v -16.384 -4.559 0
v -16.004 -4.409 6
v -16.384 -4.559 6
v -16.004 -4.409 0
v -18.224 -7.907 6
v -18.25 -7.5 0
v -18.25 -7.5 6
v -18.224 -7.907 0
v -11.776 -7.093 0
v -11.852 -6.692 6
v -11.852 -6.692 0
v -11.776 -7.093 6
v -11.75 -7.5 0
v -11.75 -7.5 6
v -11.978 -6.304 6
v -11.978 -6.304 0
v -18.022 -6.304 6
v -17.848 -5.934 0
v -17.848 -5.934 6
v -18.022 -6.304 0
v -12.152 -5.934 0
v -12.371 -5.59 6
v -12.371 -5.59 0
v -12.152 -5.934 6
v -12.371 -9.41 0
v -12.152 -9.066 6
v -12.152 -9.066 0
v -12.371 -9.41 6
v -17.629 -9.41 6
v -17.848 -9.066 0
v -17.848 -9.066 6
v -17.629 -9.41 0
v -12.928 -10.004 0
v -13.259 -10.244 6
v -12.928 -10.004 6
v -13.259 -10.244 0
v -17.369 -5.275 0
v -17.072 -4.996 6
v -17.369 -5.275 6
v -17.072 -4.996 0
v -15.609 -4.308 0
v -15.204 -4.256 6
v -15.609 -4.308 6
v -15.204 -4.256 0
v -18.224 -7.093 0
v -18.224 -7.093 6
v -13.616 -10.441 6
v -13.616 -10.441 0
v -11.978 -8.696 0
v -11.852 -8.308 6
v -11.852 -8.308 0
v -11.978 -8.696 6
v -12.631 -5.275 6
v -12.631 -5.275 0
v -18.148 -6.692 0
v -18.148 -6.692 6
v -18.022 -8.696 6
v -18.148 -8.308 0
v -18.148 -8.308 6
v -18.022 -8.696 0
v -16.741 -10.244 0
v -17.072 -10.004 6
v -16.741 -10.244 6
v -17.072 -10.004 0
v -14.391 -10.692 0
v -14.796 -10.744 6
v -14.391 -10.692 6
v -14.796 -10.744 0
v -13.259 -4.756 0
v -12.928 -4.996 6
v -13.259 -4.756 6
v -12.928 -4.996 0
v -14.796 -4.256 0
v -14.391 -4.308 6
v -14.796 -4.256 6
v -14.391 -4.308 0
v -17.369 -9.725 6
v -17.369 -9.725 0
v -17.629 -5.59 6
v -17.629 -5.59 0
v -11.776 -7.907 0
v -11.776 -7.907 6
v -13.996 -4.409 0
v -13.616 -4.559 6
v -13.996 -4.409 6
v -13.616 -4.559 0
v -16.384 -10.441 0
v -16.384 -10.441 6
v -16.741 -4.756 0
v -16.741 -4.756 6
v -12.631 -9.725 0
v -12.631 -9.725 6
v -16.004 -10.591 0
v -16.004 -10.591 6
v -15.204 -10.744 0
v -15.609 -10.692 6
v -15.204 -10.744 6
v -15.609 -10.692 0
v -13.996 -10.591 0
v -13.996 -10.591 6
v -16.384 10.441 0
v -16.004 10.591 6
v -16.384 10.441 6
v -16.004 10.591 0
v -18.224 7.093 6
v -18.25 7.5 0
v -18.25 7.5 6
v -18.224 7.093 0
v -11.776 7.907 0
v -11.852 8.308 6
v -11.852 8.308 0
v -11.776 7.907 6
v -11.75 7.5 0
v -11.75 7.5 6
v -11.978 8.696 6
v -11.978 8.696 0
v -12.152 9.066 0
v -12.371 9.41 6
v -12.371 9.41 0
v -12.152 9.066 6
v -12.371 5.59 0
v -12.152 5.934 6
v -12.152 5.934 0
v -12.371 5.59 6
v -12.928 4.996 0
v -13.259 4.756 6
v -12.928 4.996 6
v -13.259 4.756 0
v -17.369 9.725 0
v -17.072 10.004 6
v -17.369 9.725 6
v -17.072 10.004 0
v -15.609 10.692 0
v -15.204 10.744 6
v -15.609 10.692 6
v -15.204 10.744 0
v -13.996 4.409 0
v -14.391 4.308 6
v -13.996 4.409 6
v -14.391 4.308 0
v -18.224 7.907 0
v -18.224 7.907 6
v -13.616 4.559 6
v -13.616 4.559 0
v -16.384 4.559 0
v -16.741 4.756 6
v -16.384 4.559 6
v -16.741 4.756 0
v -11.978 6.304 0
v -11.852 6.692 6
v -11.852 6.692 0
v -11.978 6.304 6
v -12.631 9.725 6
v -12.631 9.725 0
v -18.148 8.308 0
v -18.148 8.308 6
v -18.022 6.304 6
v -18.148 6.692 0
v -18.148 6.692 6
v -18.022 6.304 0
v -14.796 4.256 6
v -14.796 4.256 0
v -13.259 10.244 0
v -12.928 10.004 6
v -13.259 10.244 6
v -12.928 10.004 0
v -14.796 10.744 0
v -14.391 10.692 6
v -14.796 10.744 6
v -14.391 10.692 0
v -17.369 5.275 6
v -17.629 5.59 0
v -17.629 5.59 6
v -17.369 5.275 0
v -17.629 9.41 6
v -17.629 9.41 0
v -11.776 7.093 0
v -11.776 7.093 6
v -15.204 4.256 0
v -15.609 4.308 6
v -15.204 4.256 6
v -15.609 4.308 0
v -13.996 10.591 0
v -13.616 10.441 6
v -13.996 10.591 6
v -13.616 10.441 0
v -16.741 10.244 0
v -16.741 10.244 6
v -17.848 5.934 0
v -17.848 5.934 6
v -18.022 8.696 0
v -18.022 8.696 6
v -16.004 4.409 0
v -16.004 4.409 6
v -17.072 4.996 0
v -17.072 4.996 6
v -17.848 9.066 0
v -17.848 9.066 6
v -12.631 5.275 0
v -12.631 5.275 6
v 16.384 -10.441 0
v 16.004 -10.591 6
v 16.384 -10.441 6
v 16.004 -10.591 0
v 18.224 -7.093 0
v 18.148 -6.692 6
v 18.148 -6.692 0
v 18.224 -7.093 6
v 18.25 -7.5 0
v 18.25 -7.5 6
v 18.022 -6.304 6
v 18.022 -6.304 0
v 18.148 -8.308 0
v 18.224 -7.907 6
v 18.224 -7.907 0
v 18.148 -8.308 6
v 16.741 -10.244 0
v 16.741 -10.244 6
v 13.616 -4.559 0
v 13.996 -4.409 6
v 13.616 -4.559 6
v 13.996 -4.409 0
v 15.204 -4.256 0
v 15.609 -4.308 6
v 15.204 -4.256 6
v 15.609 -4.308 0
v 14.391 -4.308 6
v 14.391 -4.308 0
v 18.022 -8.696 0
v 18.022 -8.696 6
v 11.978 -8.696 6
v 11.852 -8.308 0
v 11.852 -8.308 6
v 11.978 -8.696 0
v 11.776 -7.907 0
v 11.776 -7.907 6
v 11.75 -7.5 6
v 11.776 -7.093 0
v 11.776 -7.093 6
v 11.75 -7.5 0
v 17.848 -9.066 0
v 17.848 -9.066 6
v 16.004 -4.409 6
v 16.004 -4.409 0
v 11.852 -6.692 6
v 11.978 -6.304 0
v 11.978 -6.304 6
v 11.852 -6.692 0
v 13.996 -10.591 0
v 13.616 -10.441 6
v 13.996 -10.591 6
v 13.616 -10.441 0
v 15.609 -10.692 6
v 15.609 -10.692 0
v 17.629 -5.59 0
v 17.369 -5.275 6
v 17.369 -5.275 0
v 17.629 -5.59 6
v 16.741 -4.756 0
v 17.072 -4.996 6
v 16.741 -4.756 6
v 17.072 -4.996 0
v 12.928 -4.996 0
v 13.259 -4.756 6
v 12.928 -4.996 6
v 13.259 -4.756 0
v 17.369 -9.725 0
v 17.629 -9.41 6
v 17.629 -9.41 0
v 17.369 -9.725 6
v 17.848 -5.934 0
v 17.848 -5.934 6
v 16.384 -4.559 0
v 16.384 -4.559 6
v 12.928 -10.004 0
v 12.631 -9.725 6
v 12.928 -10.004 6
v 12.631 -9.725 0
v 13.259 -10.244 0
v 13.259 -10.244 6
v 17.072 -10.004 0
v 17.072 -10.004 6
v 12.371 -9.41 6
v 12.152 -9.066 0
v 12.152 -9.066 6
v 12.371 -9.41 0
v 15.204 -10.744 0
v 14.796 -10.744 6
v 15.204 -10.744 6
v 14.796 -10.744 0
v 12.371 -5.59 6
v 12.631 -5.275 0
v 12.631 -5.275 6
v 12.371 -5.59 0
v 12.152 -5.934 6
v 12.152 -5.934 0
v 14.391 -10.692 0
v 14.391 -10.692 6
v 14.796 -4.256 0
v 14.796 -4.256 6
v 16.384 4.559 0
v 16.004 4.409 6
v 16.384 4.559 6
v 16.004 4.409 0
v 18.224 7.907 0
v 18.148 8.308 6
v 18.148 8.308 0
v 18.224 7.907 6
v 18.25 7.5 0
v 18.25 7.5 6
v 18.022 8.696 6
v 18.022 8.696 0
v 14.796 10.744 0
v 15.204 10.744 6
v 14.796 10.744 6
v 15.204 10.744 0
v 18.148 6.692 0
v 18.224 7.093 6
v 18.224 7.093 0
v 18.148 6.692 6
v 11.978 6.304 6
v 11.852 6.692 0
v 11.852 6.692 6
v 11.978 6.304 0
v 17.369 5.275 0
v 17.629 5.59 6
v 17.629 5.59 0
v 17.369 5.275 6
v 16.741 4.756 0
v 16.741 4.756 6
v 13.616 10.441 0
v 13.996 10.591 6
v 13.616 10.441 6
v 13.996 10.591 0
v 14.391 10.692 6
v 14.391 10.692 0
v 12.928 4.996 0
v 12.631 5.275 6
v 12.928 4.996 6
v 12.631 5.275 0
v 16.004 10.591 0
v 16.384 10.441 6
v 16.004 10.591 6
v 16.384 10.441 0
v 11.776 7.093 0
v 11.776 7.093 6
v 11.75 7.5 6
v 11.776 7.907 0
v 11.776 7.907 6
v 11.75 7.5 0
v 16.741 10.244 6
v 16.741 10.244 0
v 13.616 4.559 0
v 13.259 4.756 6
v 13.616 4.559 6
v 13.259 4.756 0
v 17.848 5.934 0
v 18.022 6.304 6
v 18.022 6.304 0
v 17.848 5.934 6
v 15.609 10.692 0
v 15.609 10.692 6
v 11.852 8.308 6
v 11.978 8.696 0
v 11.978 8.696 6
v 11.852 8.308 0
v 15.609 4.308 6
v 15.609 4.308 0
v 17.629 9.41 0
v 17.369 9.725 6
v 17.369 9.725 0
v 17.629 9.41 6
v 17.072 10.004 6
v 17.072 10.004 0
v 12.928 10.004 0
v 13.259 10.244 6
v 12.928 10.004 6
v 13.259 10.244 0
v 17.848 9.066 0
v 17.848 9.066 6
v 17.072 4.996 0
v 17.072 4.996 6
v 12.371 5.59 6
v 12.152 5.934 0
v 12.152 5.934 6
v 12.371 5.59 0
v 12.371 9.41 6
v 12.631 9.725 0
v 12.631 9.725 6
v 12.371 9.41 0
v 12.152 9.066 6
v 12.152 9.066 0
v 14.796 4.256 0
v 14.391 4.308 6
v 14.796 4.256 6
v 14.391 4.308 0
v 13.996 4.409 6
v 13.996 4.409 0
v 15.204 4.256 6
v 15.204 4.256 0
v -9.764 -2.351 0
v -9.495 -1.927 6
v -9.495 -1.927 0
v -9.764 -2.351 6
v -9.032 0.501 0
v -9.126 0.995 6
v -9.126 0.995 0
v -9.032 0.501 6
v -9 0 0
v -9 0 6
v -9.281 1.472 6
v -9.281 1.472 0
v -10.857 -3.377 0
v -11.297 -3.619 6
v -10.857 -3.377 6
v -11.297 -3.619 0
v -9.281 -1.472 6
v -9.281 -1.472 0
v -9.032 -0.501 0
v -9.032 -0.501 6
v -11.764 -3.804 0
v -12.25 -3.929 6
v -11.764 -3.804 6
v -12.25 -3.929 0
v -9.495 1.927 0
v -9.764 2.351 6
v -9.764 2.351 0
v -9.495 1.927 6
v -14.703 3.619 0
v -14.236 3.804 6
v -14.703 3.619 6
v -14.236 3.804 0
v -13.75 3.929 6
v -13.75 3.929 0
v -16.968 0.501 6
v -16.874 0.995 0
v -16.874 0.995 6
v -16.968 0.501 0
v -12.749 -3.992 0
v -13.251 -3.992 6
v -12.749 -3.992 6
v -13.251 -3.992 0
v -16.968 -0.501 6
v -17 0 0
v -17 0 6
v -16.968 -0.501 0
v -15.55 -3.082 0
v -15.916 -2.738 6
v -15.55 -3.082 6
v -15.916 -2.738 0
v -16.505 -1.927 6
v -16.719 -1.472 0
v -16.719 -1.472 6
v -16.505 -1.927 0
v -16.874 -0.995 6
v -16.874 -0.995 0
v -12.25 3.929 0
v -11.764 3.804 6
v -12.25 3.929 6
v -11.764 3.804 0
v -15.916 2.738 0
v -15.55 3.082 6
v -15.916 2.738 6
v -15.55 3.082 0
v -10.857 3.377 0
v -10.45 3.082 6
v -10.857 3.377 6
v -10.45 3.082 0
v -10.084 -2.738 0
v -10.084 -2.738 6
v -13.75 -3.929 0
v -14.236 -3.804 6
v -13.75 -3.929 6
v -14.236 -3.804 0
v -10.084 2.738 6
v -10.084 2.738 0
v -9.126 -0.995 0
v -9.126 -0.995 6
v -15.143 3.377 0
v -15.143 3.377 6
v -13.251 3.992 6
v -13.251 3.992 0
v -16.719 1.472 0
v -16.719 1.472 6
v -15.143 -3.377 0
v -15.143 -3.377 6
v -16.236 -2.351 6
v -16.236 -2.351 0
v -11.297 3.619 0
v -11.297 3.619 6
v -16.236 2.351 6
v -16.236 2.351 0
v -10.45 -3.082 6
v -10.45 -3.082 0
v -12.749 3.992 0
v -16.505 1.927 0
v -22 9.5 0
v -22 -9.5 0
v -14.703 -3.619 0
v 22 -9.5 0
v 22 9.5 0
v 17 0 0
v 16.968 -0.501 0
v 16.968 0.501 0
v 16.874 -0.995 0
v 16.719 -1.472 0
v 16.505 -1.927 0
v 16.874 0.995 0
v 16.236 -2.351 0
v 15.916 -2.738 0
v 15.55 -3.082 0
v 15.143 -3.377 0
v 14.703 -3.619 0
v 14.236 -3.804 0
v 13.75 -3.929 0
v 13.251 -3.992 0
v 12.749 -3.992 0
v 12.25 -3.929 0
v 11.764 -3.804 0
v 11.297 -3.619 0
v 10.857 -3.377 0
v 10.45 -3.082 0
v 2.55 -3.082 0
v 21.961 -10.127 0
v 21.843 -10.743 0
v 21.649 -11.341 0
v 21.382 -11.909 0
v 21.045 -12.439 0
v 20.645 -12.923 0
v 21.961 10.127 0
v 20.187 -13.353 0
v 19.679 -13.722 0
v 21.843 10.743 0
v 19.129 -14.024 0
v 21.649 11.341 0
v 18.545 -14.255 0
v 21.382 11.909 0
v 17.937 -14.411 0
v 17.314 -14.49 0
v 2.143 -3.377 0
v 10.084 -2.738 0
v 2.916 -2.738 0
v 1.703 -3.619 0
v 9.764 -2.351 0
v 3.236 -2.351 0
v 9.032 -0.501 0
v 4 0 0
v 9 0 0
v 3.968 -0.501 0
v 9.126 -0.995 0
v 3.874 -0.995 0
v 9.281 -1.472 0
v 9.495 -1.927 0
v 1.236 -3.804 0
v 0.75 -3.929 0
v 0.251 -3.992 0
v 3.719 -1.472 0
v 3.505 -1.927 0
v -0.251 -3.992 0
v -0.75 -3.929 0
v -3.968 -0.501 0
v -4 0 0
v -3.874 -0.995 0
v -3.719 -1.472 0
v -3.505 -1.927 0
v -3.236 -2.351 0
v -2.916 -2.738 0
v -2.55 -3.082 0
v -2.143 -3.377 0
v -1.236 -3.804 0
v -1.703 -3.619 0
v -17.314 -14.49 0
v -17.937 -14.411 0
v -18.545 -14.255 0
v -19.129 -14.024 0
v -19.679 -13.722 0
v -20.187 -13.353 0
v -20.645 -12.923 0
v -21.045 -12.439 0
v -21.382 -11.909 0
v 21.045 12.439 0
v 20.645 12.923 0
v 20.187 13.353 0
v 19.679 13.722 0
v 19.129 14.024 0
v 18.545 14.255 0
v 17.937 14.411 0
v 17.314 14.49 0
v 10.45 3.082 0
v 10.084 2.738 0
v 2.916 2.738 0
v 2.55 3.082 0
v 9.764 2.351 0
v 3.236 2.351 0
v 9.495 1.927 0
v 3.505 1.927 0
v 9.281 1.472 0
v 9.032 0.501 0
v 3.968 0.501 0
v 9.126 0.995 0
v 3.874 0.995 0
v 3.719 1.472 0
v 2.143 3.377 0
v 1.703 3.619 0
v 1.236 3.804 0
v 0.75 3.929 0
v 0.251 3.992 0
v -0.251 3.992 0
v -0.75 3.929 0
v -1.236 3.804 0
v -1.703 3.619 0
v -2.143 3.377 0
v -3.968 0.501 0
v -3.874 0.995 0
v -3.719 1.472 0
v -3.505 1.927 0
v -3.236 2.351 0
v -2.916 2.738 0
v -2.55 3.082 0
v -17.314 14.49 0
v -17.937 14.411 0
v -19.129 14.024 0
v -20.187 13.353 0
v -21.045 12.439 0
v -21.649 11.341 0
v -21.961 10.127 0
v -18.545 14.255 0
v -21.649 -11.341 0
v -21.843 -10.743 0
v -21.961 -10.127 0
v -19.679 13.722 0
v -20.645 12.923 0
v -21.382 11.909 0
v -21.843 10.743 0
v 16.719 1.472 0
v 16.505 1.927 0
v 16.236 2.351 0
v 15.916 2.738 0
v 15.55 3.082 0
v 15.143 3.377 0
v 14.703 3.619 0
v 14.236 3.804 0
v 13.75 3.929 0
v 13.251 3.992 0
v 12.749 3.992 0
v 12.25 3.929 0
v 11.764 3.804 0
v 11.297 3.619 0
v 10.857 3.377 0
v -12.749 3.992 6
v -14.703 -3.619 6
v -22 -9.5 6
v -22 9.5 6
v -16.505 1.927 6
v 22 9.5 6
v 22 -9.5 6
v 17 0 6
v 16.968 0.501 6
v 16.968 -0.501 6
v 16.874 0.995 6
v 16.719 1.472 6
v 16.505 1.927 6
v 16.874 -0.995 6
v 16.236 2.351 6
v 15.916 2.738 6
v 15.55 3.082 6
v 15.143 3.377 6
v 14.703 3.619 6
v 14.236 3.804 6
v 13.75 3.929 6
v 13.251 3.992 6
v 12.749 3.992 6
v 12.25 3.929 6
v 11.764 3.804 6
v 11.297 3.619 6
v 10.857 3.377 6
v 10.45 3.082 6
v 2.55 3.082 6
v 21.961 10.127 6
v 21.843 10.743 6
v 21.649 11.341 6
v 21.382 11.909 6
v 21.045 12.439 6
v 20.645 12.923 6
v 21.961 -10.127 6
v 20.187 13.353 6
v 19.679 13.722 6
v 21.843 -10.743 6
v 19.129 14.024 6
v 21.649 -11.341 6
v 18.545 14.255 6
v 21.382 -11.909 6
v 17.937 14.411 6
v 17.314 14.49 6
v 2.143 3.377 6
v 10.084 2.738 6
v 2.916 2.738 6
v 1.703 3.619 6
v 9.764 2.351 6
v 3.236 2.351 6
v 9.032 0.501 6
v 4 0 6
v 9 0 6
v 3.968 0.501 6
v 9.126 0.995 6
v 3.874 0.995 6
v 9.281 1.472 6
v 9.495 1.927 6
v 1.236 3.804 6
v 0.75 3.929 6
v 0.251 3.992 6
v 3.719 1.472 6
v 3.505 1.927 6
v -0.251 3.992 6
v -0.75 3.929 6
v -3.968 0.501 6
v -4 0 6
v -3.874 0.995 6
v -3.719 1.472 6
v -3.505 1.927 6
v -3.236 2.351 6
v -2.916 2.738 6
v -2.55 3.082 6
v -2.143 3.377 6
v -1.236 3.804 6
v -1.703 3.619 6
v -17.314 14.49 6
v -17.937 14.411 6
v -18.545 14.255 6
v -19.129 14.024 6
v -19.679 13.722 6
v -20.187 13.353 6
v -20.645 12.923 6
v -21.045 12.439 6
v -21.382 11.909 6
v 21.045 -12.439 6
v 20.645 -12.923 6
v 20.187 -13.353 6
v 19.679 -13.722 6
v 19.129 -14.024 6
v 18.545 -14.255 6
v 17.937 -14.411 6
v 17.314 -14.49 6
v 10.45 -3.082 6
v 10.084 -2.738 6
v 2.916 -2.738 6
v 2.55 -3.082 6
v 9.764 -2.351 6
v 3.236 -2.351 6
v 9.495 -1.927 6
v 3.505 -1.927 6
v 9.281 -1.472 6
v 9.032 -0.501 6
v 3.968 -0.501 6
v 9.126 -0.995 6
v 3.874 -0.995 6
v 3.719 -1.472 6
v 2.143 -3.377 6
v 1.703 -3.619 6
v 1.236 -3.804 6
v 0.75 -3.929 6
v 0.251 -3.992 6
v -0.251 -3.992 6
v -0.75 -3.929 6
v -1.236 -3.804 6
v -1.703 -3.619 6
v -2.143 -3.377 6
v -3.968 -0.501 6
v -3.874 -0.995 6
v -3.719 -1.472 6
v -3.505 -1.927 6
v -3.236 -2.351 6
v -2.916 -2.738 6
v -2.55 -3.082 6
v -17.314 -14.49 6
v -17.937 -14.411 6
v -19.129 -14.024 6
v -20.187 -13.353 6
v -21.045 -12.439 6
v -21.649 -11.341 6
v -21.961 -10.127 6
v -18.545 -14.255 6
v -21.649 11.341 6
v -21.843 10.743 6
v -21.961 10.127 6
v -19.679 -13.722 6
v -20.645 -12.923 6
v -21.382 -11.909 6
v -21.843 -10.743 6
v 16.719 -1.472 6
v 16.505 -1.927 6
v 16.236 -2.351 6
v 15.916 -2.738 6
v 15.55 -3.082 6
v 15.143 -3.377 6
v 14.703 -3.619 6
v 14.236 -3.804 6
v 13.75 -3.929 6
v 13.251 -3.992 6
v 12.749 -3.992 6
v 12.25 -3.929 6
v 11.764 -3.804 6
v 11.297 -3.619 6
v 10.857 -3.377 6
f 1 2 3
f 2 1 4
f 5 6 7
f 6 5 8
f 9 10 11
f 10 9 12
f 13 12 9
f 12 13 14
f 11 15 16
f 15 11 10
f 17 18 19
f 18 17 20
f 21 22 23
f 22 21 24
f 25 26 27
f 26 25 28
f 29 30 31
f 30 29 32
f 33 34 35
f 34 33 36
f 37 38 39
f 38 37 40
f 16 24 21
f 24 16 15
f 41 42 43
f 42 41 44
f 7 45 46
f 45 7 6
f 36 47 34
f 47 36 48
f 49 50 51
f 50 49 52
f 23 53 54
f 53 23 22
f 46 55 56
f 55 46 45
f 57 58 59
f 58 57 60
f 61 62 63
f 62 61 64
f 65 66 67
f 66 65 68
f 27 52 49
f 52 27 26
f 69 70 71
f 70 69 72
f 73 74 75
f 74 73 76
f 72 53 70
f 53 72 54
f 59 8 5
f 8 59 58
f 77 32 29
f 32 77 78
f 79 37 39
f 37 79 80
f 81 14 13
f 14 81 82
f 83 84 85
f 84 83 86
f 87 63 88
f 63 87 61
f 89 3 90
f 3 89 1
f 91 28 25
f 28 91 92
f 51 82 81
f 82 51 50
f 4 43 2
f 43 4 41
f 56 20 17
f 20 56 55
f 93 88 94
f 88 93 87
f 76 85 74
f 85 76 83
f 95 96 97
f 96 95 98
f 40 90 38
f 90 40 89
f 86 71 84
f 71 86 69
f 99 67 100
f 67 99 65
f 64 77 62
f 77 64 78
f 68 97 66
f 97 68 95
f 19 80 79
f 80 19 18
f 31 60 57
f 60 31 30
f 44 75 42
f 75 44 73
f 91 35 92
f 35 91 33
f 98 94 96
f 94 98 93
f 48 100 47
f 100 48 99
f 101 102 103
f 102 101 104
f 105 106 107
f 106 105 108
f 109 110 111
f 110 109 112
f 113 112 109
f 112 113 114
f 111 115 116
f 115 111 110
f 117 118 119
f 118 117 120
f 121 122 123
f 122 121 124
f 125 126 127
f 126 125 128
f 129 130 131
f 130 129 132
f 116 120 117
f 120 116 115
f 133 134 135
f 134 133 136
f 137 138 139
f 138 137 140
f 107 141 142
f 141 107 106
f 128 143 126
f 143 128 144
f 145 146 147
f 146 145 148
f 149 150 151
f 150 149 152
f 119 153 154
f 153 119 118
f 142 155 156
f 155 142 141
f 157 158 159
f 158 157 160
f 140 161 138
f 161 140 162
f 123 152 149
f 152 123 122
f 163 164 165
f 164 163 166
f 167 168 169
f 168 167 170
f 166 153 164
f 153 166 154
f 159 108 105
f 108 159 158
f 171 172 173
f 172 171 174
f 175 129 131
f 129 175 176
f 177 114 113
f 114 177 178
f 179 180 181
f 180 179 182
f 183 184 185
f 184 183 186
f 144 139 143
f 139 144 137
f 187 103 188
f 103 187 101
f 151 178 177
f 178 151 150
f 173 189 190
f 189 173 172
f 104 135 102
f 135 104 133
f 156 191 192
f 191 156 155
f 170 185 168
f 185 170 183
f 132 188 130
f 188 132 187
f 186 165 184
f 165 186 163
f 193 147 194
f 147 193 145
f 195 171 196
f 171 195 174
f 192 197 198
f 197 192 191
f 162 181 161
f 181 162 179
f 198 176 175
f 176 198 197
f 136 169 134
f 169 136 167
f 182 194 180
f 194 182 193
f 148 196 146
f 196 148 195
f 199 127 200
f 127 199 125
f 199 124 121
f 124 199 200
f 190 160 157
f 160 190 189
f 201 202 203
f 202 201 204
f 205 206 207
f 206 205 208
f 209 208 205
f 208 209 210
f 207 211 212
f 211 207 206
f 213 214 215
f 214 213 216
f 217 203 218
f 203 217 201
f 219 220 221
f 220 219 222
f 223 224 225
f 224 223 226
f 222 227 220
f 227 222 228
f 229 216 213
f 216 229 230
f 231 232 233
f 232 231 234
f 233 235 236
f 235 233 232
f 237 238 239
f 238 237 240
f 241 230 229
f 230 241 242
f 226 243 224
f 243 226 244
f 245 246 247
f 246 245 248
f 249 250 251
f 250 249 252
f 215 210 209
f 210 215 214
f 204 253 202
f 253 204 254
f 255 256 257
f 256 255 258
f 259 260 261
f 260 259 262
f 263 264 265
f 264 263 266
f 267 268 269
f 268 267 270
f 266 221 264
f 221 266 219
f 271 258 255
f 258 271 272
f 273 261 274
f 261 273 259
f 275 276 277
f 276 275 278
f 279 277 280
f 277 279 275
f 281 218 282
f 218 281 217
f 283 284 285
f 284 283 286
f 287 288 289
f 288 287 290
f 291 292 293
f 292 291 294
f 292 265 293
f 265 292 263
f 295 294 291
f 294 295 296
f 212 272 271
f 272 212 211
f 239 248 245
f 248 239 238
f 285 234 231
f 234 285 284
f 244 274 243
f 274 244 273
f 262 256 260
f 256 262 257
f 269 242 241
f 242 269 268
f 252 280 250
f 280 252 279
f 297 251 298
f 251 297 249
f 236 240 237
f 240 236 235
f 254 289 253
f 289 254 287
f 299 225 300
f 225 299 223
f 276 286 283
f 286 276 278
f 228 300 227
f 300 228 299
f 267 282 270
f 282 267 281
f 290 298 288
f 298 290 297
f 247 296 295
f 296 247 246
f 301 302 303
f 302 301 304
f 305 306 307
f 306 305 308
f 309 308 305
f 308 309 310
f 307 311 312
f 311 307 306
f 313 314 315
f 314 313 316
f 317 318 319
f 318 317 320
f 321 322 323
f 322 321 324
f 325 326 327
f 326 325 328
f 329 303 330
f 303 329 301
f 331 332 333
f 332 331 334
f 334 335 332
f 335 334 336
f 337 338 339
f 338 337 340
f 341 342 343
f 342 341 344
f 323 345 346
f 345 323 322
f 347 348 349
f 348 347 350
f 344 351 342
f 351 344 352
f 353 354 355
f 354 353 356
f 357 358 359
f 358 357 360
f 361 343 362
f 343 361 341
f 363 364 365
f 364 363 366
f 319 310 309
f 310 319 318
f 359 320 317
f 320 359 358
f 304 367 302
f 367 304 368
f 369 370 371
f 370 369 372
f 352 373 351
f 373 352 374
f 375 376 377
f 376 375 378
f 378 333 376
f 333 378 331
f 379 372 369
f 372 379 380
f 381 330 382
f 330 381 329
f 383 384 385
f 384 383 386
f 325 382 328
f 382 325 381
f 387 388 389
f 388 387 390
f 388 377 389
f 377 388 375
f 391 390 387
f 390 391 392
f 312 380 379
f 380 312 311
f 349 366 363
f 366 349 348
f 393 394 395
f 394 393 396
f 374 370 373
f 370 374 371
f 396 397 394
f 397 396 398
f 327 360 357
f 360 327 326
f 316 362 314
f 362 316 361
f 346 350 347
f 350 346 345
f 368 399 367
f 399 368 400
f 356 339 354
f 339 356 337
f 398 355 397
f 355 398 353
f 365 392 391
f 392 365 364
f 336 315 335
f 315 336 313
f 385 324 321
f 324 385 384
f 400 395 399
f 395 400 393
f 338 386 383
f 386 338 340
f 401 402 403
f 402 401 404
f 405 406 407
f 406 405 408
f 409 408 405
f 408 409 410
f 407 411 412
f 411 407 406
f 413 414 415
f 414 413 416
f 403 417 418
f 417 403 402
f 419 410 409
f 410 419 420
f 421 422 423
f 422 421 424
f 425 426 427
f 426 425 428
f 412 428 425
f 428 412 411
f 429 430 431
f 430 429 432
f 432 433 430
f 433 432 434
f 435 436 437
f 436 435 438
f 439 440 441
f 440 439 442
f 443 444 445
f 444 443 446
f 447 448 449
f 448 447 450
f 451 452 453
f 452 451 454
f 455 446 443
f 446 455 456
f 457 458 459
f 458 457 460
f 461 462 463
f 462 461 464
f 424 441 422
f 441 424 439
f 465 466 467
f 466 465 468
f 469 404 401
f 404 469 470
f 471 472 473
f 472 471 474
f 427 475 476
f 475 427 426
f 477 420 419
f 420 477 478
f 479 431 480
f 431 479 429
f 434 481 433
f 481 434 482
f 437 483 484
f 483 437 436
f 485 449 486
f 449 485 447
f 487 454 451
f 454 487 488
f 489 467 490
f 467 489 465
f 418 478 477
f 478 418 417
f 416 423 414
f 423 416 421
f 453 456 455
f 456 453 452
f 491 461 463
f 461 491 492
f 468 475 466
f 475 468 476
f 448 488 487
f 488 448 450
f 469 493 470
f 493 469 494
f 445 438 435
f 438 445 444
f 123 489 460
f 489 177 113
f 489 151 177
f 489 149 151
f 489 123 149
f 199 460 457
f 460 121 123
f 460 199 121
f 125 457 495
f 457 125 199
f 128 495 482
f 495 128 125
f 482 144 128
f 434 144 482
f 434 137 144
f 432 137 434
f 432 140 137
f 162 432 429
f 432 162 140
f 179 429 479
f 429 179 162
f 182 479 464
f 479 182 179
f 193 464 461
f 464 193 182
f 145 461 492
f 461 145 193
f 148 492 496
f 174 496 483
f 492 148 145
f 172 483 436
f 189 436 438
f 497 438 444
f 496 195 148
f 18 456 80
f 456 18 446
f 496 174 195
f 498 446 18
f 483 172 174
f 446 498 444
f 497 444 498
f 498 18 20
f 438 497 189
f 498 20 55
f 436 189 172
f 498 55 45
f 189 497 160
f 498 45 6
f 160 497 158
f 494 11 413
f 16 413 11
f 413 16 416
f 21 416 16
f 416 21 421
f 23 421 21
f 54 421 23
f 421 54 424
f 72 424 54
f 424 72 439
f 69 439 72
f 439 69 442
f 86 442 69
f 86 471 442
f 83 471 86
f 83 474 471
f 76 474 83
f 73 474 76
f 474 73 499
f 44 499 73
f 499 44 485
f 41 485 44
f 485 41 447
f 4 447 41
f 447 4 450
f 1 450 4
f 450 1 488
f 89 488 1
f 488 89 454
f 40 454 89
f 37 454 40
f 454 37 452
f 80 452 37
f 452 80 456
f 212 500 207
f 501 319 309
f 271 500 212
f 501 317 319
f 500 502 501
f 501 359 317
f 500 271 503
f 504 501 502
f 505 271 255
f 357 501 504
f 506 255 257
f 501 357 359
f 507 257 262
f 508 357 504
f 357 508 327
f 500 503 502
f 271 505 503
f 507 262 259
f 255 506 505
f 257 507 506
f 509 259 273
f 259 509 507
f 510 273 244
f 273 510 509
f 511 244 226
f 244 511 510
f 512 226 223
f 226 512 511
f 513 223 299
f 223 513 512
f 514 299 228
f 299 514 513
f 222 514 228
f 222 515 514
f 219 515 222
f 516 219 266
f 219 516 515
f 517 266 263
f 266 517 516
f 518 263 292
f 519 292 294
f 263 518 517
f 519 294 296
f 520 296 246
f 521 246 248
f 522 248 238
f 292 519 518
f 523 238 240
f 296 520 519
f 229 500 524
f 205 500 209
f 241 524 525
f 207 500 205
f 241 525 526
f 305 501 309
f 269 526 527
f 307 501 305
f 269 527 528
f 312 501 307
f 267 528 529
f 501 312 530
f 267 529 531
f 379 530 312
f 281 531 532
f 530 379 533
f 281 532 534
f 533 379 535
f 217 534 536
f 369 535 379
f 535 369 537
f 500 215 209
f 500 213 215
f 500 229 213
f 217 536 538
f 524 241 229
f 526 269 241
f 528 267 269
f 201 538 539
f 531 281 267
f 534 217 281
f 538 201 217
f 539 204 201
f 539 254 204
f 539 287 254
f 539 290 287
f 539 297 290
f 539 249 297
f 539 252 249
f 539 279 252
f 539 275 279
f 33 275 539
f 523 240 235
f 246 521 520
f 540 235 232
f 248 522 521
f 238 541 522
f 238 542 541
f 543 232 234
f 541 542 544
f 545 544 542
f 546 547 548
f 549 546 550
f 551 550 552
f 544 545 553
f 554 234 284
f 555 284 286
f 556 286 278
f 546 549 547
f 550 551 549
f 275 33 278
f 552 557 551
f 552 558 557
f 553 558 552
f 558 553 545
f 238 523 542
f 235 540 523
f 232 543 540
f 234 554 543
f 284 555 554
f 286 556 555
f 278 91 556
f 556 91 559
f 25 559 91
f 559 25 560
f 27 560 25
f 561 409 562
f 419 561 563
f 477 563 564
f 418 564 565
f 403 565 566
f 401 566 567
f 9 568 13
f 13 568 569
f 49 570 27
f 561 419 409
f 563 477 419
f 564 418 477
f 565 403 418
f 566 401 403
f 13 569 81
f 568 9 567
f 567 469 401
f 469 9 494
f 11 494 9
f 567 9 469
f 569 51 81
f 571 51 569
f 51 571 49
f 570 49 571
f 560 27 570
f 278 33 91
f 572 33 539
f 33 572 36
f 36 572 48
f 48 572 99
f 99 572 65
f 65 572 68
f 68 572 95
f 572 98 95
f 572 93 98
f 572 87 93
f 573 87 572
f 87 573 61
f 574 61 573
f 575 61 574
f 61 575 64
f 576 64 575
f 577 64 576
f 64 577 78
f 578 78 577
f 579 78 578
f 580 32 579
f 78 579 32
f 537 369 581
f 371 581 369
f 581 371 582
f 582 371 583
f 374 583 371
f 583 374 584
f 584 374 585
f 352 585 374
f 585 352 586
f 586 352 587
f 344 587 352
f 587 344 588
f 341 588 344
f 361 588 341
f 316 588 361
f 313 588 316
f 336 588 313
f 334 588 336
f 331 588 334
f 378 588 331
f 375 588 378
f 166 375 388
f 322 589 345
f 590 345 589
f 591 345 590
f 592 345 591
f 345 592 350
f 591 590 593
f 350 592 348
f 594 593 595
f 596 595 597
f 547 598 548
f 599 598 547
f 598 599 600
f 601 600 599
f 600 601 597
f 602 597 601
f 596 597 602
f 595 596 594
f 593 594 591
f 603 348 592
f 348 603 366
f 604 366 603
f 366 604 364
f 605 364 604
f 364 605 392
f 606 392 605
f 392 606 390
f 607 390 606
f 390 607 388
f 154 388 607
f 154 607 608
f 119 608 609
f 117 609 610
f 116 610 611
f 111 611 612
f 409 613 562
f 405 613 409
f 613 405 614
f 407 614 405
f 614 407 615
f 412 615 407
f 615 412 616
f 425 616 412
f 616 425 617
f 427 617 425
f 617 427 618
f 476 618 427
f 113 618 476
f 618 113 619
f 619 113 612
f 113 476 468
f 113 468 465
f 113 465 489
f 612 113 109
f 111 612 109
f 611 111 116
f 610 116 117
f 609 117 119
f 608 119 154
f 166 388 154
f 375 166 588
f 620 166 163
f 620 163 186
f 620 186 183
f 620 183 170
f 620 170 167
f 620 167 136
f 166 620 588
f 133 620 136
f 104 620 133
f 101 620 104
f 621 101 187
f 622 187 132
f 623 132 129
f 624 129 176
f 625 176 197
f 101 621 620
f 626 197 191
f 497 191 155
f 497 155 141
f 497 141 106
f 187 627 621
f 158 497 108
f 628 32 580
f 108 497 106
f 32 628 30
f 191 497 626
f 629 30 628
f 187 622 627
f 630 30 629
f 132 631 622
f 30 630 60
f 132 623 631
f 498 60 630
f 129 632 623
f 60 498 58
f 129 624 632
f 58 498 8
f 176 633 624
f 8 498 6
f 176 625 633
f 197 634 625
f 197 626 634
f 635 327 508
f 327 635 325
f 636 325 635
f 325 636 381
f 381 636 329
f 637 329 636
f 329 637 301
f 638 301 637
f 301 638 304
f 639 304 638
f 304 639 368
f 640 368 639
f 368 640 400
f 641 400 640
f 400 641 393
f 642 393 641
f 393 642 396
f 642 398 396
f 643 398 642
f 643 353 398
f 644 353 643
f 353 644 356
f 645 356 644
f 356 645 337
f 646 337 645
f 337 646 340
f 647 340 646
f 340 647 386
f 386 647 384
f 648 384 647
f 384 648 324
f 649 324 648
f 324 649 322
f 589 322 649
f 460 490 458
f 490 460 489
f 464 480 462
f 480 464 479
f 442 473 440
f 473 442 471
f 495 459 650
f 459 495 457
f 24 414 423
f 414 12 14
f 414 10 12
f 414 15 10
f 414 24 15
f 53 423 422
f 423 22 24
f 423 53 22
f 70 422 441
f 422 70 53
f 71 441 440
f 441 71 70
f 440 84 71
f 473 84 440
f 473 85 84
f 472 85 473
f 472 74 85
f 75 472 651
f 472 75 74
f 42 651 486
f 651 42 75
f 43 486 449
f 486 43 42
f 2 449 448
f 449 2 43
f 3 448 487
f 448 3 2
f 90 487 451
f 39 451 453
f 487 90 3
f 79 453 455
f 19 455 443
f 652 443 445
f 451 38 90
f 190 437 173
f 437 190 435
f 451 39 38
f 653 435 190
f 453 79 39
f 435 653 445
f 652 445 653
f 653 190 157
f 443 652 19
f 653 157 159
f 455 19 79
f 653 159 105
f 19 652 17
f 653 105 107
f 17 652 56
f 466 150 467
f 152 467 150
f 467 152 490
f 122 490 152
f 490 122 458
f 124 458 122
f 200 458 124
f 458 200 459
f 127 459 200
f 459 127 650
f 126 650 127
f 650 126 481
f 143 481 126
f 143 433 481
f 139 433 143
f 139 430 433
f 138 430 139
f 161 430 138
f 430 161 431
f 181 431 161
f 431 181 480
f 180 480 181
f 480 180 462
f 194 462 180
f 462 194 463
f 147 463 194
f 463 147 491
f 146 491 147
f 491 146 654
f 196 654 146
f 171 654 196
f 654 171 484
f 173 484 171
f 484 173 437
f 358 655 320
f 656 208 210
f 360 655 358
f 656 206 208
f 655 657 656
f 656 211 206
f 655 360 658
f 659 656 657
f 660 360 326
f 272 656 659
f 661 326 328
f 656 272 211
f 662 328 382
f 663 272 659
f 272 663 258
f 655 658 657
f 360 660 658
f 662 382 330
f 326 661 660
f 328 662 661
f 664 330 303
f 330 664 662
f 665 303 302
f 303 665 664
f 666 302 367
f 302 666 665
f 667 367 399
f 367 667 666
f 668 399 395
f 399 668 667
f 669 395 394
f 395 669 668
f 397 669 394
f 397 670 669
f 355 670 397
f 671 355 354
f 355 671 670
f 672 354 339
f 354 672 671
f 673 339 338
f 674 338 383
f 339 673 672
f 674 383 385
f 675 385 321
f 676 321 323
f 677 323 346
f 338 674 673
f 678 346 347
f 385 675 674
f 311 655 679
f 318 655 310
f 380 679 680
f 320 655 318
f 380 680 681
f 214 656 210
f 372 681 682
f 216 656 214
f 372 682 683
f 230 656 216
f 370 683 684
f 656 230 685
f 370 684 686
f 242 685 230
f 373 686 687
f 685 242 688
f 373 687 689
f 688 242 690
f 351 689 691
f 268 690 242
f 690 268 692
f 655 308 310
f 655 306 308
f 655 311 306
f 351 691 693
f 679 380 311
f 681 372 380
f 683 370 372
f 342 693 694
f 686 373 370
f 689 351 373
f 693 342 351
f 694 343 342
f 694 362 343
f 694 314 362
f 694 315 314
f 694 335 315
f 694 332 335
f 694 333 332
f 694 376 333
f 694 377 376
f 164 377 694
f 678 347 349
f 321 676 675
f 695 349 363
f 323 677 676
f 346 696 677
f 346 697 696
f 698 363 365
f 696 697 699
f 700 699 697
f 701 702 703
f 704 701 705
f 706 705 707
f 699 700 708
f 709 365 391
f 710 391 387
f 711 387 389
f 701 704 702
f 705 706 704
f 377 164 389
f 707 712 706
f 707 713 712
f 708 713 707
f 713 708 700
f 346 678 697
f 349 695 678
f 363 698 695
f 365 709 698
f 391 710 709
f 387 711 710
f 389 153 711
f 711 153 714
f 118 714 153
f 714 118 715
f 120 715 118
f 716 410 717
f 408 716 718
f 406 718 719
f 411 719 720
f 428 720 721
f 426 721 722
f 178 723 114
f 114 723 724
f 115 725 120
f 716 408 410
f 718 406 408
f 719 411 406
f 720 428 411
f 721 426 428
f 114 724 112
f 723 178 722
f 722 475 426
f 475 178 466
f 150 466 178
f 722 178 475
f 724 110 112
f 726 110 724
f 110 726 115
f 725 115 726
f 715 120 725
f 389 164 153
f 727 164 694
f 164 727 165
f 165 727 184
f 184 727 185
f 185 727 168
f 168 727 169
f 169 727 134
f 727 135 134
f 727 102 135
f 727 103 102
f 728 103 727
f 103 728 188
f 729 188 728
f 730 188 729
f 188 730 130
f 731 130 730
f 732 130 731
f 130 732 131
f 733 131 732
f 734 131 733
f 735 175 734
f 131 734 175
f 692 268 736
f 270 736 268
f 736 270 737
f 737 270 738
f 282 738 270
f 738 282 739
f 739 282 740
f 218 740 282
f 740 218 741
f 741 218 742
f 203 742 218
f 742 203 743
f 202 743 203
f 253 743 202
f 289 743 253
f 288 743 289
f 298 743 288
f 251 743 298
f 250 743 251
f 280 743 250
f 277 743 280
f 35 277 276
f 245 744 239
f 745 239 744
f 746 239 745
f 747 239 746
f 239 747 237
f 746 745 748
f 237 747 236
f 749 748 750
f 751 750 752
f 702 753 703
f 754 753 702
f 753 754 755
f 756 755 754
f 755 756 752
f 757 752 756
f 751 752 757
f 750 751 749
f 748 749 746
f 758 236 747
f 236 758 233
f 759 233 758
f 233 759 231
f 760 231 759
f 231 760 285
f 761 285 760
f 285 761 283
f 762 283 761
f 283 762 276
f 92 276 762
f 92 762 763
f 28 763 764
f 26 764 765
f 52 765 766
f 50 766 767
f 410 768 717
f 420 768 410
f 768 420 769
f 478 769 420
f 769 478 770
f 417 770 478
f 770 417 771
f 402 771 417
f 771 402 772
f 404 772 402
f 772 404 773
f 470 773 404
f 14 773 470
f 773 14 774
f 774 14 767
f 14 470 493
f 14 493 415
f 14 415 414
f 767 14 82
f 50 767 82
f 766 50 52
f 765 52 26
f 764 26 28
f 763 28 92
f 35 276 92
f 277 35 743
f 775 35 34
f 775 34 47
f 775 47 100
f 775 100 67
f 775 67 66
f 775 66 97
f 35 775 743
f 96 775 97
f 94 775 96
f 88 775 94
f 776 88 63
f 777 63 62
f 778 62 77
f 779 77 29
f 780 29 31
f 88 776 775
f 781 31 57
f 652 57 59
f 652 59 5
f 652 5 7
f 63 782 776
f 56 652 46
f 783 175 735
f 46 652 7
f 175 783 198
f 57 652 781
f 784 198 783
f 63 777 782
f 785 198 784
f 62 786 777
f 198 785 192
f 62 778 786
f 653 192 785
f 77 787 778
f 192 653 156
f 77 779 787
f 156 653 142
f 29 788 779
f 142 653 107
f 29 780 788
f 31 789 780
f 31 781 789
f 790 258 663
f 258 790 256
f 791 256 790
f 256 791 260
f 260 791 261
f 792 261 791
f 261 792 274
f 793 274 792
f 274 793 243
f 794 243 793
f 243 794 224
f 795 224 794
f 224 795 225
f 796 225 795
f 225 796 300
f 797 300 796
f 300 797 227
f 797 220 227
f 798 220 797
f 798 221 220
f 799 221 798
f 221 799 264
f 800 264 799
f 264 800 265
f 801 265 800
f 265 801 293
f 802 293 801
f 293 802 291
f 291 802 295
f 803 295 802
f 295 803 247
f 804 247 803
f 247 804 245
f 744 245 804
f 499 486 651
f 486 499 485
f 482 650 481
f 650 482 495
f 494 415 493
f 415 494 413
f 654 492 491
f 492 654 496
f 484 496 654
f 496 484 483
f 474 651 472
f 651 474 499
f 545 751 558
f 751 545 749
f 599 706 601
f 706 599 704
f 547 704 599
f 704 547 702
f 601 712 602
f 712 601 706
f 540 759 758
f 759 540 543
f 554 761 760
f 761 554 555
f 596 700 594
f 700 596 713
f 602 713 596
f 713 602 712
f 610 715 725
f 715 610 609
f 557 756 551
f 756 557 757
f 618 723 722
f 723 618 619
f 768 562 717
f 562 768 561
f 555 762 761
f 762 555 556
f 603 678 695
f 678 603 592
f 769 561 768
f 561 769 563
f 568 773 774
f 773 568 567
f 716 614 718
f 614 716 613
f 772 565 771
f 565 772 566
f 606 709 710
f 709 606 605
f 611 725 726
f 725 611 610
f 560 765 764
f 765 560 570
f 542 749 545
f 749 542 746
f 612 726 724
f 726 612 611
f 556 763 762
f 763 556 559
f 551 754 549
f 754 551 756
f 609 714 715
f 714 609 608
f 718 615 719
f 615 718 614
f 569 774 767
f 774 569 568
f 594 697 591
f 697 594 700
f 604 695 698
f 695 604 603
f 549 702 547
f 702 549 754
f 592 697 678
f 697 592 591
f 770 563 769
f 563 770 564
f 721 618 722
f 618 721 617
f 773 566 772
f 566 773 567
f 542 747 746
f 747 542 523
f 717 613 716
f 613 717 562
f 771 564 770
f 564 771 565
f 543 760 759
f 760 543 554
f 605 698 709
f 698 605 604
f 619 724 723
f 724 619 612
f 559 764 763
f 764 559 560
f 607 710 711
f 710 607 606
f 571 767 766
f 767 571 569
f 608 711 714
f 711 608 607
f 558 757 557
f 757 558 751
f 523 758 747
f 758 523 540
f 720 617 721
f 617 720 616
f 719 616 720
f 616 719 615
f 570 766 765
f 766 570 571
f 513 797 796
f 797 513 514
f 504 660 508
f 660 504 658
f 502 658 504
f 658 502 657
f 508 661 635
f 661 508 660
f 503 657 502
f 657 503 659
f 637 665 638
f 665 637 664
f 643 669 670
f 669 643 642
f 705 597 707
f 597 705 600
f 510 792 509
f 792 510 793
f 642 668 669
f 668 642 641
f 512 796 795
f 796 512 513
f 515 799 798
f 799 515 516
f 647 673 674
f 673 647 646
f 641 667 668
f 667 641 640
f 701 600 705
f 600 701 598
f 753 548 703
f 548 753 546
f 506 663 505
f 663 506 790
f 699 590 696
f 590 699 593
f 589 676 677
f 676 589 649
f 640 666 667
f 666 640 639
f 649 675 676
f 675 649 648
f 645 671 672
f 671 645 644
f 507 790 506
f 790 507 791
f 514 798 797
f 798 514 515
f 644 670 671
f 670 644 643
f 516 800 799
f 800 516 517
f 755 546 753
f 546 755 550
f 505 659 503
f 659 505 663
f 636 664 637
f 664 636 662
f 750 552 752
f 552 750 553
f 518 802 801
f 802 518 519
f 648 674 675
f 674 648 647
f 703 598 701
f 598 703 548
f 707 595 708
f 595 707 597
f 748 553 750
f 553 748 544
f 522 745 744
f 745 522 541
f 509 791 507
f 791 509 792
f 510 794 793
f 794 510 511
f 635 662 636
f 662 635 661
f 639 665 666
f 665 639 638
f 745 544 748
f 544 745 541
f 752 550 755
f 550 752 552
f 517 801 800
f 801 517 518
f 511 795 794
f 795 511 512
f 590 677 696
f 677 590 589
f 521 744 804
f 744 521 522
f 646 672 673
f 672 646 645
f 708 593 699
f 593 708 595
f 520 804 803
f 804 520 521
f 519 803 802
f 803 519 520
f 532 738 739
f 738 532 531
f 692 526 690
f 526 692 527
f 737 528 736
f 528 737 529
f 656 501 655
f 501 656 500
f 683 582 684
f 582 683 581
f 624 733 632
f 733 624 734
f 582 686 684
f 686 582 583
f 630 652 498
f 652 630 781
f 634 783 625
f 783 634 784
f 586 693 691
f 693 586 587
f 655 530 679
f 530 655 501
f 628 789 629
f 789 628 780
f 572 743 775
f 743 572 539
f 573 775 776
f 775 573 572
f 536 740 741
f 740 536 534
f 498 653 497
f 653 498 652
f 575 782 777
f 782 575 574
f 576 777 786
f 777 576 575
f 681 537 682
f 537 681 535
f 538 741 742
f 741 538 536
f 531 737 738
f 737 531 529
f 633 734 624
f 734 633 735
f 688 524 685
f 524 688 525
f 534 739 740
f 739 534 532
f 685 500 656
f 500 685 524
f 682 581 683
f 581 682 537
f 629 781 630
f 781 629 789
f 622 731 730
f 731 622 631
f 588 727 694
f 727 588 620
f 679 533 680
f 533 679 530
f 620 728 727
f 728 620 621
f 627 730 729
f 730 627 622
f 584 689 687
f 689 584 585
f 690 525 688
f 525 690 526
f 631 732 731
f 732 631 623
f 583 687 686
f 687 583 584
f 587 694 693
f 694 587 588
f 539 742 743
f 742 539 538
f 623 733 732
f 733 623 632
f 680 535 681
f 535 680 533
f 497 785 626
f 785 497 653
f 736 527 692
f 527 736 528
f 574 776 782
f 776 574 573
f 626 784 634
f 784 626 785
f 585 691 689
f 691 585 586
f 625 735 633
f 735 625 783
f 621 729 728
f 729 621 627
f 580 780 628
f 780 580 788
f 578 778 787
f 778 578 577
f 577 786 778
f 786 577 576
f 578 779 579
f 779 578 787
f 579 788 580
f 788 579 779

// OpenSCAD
$fn = 50;


difference() {
	union() {
		hull() {
			translate(v = [-17.0000000000, 9.5000000000, 0]) {
				cylinder(h = 6, r = 5);
			}
			translate(v = [17.0000000000, 9.5000000000, 0]) {
				cylinder(h = 6, r = 5);
			}
			translate(v = [-17.0000000000, -9.5000000000, 0]) {
				cylinder(h = 6, r = 5);
			}
			translate(v = [17.0000000000, -9.5000000000, 0]) {
				cylinder(h = 6, r = 5);
			}
		}
	}
	union() {
		#translate(v = [-15.0000000000, -7.5000000000, -100.0000000000]) {
			cylinder(h = 200, r = 3.2500000000);
		}
		#translate(v = [-15.0000000000, 7.5000000000, -100.0000000000]) {
			cylinder(h = 200, r = 3.2500000000);
		}
		#translate(v = [15.0000000000, -7.5000000000, -100.0000000000]) {
			cylinder(h = 200, r = 3.2500000000);
		}
		#translate(v = [15.0000000000, 7.5000000000, -100.0000000000]) {
			cylinder(h = 200, r = 3.2500000000);
		}
		#translate(v = [-13.0000000000, 0, 0]) {
			cylinder(h = 6, r = 4.0000000000);
		}
		#cylinder(h = 6, r = 4.0000000000);
		#translate(v = [13.0000000000, 0, 0]) {
			cylinder(h = 6, r = 4.0000000000);
		}
	}
}
